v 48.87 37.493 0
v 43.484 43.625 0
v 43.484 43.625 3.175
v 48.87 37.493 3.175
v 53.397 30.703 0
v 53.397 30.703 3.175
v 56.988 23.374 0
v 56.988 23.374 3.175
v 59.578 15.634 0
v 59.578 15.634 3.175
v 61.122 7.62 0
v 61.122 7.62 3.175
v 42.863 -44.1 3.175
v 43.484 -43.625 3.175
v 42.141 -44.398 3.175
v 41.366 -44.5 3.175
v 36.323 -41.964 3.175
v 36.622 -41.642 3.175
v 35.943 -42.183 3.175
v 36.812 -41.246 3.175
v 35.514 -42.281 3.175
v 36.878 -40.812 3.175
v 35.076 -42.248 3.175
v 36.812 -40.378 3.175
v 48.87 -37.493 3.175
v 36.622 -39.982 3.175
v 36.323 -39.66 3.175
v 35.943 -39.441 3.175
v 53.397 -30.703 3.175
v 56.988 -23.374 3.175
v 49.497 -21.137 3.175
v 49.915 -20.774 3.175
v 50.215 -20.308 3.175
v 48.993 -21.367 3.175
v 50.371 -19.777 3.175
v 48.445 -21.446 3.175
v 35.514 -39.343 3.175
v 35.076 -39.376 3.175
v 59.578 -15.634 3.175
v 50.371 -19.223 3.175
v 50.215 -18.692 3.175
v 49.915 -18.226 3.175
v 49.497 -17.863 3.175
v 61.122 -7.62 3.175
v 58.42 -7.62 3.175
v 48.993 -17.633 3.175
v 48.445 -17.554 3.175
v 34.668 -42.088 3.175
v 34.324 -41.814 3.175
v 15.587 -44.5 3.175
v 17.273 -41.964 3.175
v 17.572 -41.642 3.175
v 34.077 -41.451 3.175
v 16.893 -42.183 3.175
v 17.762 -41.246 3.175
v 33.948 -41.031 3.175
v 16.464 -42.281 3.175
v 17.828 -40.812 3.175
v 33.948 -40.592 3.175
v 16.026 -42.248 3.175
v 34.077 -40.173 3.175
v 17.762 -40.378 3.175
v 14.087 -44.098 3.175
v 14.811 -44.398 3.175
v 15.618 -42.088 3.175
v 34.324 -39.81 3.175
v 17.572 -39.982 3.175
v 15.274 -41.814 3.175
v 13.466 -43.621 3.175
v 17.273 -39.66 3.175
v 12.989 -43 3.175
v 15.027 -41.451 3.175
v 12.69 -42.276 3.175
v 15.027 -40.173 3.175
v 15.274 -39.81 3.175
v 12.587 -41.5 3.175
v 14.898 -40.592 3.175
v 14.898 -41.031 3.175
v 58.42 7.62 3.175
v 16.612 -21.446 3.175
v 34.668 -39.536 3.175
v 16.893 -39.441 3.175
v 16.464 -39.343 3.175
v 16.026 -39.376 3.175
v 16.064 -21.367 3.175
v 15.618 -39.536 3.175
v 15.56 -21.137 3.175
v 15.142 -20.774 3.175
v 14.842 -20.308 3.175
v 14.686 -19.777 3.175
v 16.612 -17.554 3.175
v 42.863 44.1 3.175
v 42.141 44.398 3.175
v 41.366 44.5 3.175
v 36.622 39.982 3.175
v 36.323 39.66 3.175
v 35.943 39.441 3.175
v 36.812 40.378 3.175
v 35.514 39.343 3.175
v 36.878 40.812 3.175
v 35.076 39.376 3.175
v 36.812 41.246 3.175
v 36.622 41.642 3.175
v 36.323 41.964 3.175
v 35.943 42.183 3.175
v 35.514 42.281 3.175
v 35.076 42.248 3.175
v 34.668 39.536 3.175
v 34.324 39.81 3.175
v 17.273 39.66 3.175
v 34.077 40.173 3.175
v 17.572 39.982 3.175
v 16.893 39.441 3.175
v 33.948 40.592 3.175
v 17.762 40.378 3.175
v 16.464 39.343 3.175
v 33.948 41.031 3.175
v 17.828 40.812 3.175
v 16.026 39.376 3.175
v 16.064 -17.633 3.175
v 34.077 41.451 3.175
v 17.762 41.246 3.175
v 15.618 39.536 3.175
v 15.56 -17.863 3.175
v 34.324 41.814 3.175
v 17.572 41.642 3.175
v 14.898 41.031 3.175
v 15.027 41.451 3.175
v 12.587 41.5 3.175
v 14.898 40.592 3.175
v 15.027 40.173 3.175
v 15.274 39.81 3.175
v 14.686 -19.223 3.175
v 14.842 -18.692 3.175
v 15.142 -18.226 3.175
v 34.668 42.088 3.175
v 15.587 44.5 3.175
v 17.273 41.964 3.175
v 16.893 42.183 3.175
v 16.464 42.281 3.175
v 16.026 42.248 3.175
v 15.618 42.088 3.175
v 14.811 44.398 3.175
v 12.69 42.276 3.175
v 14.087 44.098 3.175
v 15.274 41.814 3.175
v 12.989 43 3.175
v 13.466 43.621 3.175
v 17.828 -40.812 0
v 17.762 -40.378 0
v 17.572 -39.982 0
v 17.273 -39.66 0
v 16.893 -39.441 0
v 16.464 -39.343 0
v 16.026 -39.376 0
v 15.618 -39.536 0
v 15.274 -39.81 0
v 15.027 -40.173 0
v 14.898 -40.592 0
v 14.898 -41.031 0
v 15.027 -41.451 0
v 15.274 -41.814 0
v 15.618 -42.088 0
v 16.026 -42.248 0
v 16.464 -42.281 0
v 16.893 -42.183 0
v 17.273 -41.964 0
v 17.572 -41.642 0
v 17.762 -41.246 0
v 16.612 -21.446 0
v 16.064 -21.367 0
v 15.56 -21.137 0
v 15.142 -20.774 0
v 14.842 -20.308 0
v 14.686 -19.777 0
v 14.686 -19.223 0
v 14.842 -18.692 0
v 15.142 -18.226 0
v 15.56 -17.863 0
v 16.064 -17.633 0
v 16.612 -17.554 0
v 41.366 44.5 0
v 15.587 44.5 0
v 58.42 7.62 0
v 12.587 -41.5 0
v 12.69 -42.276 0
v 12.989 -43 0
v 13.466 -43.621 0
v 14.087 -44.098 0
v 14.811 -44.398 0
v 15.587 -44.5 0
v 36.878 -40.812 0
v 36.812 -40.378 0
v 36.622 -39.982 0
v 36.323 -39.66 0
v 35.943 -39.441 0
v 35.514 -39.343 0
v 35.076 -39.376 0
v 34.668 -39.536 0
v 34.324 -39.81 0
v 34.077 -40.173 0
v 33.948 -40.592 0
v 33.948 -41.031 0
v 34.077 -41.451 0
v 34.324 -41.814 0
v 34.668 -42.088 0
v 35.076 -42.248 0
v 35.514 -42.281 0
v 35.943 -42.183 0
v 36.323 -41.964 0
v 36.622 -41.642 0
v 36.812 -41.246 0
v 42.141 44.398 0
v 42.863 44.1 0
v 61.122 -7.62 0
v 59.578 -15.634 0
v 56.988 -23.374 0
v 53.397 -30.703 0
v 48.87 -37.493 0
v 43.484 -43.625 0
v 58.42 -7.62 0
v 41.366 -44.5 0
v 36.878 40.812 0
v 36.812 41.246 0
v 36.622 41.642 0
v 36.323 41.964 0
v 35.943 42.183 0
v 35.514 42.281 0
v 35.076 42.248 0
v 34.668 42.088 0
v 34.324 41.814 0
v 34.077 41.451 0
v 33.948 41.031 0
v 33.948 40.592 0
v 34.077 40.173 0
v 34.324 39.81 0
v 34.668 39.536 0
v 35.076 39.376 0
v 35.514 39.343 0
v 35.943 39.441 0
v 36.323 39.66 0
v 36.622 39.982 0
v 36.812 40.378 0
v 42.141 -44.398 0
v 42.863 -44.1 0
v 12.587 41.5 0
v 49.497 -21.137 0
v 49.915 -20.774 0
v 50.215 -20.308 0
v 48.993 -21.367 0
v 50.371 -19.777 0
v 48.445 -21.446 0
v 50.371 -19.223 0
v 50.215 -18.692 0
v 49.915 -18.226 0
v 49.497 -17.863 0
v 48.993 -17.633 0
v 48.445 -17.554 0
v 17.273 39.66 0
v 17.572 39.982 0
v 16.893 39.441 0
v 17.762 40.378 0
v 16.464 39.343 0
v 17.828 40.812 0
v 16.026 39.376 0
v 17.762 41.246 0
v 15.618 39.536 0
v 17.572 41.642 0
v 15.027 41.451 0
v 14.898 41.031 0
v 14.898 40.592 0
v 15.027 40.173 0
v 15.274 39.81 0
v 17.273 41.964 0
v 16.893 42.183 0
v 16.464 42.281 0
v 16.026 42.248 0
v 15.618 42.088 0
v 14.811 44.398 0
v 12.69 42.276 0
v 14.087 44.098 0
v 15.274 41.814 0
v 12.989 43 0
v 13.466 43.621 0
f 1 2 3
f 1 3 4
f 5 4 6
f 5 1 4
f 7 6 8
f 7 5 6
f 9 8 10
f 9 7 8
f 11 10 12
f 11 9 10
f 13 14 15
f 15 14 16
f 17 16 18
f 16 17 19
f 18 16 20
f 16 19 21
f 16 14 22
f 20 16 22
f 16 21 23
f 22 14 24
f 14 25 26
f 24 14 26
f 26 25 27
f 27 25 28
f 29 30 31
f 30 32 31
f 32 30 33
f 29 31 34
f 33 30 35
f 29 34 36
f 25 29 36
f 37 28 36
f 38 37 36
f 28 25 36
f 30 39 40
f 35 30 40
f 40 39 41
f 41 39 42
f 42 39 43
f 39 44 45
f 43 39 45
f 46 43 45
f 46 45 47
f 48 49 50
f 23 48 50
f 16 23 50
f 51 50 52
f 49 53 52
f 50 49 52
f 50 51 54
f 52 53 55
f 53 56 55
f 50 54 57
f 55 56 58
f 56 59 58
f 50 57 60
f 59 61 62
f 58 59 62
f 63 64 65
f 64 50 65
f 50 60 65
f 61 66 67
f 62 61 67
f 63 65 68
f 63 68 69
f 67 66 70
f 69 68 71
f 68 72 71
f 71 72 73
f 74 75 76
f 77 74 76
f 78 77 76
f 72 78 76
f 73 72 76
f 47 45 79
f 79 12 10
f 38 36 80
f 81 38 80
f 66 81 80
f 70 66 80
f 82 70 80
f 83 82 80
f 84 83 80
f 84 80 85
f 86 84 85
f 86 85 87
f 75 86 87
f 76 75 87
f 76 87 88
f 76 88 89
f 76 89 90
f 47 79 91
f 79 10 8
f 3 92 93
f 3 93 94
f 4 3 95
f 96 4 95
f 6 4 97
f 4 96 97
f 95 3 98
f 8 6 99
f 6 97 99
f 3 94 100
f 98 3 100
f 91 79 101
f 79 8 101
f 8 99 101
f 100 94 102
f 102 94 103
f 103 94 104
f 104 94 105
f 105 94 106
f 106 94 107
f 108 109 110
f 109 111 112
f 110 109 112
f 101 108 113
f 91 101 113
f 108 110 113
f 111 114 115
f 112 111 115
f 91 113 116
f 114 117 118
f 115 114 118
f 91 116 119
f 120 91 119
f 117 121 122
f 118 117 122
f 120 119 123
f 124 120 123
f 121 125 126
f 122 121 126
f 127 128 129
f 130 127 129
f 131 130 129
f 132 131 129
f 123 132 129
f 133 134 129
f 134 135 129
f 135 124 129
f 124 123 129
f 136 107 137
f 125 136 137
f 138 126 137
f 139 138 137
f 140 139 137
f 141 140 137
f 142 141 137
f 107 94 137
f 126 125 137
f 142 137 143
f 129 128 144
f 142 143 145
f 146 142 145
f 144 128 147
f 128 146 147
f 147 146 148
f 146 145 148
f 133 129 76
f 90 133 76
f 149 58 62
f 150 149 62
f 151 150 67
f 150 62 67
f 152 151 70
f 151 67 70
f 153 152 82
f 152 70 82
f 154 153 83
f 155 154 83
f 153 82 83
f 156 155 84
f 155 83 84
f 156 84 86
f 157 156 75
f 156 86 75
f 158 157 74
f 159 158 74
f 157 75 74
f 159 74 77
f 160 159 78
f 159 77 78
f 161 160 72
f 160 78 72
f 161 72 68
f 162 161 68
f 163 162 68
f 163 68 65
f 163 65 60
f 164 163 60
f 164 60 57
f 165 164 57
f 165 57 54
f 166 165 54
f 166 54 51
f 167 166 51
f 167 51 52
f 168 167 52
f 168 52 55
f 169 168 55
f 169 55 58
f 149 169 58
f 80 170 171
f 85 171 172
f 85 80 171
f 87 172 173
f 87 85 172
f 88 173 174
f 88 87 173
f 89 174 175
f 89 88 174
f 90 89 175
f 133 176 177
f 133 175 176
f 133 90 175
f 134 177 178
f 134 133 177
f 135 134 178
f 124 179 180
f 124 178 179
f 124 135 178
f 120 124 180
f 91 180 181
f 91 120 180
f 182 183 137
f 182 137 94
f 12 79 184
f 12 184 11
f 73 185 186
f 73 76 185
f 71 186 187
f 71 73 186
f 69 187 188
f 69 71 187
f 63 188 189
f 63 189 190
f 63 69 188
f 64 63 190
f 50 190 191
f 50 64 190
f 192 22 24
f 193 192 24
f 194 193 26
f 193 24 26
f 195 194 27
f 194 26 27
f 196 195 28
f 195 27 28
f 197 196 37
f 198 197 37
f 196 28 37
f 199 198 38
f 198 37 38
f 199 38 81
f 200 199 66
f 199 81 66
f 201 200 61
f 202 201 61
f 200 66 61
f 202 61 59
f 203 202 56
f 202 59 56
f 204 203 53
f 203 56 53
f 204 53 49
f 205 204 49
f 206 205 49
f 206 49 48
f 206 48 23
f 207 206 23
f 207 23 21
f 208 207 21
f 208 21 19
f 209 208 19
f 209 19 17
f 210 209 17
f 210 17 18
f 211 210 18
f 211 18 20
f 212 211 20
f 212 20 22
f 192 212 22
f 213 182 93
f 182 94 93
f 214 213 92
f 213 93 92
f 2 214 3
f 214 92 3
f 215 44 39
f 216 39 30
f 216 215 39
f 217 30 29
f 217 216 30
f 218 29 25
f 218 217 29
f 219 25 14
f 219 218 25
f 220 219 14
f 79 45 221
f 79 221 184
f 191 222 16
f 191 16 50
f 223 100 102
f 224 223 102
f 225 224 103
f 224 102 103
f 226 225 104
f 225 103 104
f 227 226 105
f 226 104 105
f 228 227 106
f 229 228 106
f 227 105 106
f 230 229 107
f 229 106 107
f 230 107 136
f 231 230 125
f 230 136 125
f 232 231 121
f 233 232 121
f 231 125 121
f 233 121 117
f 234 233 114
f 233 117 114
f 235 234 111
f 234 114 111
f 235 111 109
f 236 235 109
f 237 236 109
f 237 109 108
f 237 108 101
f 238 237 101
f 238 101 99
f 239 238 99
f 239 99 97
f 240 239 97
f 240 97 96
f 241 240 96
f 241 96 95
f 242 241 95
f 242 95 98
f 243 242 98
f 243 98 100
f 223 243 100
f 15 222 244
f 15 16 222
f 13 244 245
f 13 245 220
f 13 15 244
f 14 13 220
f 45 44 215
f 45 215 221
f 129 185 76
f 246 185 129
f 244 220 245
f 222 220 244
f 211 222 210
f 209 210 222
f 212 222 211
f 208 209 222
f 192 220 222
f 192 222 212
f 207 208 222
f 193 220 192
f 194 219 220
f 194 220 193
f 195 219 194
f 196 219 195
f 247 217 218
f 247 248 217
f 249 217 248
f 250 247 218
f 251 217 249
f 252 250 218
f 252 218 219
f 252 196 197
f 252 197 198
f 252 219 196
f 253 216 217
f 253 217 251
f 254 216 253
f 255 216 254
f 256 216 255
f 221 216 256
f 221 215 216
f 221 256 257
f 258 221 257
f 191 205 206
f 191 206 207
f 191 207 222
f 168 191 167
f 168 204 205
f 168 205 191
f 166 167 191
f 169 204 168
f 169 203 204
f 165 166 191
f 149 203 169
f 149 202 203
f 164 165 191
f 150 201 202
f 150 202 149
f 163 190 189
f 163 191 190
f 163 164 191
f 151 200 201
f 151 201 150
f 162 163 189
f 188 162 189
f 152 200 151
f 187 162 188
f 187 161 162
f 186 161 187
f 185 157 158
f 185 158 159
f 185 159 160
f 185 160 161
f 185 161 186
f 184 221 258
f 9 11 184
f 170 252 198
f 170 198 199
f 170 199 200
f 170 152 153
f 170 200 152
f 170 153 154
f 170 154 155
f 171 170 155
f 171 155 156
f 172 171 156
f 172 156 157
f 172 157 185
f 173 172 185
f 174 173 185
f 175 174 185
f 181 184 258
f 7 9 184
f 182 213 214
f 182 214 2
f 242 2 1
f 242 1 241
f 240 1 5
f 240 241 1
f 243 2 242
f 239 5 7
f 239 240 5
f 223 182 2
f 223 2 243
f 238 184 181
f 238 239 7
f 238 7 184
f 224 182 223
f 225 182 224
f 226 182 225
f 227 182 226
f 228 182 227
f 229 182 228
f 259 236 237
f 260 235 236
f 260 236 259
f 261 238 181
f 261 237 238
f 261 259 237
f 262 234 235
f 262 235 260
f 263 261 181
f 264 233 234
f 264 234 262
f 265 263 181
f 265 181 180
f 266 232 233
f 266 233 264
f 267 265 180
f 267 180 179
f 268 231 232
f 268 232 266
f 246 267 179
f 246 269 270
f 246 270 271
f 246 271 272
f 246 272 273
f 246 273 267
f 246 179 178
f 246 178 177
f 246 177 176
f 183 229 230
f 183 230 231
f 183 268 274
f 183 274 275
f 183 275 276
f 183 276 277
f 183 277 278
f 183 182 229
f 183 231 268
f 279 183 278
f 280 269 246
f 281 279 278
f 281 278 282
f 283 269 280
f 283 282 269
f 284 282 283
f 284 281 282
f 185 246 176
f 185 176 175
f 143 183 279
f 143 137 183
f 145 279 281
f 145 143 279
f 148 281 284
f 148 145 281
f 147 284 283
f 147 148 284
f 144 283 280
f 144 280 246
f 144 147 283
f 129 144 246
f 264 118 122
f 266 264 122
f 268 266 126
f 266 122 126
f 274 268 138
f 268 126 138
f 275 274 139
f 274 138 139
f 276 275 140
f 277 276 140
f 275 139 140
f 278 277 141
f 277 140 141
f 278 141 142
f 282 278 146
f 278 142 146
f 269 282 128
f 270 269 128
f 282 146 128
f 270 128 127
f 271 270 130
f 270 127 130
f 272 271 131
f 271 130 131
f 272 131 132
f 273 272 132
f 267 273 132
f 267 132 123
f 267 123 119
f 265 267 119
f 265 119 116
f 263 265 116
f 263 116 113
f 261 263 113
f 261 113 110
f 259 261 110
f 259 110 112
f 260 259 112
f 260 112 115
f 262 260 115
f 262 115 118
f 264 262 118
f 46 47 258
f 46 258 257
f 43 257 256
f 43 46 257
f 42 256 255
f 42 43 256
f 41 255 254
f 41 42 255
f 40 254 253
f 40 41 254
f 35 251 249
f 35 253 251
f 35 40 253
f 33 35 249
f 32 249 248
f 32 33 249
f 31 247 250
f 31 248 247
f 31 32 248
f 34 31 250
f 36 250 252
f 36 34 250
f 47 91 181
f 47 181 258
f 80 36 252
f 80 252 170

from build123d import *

# Parameters (mm, degrees)
BOSS_EXTRUDE1_DEPTH = 3.175
SKETCH2_R           = 1.4732
CUT_EXTRUDE1_DEPTH  = 4.175
CUT_EXTRUDE2_DEPTH  = 4.175
FILLET1_R           = 3
CUT_EXTRUDE5_DEPTH  = 4.175


with BuildPart() as part:
    # Sketch1 → Boss-Extrude1 (new body)
    with BuildSketch(Plane.XY):
        with BuildLine():
            Line((12.587486719, 44.5), (42.587486719, 44.5))
            ThreePointArc((42.587486719, 44.5), (61.594999998, 0), (42.587486719, -44.5))
            Line((42.587486719, -44.5), (12.587486719, -44.5))
            Line((12.587486719, -44.5), (12.587486719, 44.5))
        make_face()
    extrude(amount=BOSS_EXTRUDE1_DEPTH)

    # Sketch2 → Cut-Extrude1 (cut, through all)
    with BuildSketch(Plane.XY.offset(3.175)):
        with Locations((16.354311186, -40.81189221)):
            Circle(SKETCH2_R)
        with Locations((35.404311186, -40.81189221)):
            Circle(SKETCH2_R)
        with Locations((16.354311186, 40.81189221)):
            Circle(SKETCH2_R)
        with Locations((35.404311186, 40.81189221)):
            Circle(SKETCH2_R)
    extrude(amount=-CUT_EXTRUDE1_DEPTH, mode=Mode.SUBTRACT)

    # Sketch3 → Cut-Extrude2 (cut, through all)
    with BuildSketch(Plane.XY.offset(3.175)):
        with BuildLine():
            Line((58.42, 7.62), (61.121842452, 7.62))
            ThreePointArc((61.121842452, 7.62), (61.594999998, 0), (61.121842452, -7.62))
            Line((61.121842452, -7.62), (58.42, -7.62))
            Line((58.42, -7.62), (58.42, 7.62))
        make_face()
    extrude(amount=-CUT_EXTRUDE2_DEPTH, mode=Mode.SUBTRACT)

    # Fillet1
    fillet1_edges = [part.edges().sort_by_distance(p)[0] for p in [
        (12.587486719, 44.5, 1.5875),
        (42.587486719, 44.5, 1.5875),
        (42.587486719, -44.5, 1.5875),
        (12.587486719, -44.5, 1.5875),
    ]]
    fillet(fillet1_edges, radius=FILLET1_R)

    # Sketch5 → Cut-Extrude5 (cut, through all)
    with BuildSketch(Plane.XY.offset(3.175)):
        with BuildLine():
            Line((16.612162061, -17.554236987), (48.444763602, -17.554236987))
            ThreePointArc((48.444763602, -17.554236987), (50.390526615, -19.5), (48.444763602, -21.445763013))
            Line((48.444763602, -21.445763013), (16.612162061, -21.445763013))
            ThreePointArc((16.612162061, -21.445763013), (14.666399048, -19.5), (16.612162061, -17.554236987))
        make_face()
    extrude(amount=-CUT_EXTRUDE5_DEPTH, mode=Mode.SUBTRACT)


solid = part.part
